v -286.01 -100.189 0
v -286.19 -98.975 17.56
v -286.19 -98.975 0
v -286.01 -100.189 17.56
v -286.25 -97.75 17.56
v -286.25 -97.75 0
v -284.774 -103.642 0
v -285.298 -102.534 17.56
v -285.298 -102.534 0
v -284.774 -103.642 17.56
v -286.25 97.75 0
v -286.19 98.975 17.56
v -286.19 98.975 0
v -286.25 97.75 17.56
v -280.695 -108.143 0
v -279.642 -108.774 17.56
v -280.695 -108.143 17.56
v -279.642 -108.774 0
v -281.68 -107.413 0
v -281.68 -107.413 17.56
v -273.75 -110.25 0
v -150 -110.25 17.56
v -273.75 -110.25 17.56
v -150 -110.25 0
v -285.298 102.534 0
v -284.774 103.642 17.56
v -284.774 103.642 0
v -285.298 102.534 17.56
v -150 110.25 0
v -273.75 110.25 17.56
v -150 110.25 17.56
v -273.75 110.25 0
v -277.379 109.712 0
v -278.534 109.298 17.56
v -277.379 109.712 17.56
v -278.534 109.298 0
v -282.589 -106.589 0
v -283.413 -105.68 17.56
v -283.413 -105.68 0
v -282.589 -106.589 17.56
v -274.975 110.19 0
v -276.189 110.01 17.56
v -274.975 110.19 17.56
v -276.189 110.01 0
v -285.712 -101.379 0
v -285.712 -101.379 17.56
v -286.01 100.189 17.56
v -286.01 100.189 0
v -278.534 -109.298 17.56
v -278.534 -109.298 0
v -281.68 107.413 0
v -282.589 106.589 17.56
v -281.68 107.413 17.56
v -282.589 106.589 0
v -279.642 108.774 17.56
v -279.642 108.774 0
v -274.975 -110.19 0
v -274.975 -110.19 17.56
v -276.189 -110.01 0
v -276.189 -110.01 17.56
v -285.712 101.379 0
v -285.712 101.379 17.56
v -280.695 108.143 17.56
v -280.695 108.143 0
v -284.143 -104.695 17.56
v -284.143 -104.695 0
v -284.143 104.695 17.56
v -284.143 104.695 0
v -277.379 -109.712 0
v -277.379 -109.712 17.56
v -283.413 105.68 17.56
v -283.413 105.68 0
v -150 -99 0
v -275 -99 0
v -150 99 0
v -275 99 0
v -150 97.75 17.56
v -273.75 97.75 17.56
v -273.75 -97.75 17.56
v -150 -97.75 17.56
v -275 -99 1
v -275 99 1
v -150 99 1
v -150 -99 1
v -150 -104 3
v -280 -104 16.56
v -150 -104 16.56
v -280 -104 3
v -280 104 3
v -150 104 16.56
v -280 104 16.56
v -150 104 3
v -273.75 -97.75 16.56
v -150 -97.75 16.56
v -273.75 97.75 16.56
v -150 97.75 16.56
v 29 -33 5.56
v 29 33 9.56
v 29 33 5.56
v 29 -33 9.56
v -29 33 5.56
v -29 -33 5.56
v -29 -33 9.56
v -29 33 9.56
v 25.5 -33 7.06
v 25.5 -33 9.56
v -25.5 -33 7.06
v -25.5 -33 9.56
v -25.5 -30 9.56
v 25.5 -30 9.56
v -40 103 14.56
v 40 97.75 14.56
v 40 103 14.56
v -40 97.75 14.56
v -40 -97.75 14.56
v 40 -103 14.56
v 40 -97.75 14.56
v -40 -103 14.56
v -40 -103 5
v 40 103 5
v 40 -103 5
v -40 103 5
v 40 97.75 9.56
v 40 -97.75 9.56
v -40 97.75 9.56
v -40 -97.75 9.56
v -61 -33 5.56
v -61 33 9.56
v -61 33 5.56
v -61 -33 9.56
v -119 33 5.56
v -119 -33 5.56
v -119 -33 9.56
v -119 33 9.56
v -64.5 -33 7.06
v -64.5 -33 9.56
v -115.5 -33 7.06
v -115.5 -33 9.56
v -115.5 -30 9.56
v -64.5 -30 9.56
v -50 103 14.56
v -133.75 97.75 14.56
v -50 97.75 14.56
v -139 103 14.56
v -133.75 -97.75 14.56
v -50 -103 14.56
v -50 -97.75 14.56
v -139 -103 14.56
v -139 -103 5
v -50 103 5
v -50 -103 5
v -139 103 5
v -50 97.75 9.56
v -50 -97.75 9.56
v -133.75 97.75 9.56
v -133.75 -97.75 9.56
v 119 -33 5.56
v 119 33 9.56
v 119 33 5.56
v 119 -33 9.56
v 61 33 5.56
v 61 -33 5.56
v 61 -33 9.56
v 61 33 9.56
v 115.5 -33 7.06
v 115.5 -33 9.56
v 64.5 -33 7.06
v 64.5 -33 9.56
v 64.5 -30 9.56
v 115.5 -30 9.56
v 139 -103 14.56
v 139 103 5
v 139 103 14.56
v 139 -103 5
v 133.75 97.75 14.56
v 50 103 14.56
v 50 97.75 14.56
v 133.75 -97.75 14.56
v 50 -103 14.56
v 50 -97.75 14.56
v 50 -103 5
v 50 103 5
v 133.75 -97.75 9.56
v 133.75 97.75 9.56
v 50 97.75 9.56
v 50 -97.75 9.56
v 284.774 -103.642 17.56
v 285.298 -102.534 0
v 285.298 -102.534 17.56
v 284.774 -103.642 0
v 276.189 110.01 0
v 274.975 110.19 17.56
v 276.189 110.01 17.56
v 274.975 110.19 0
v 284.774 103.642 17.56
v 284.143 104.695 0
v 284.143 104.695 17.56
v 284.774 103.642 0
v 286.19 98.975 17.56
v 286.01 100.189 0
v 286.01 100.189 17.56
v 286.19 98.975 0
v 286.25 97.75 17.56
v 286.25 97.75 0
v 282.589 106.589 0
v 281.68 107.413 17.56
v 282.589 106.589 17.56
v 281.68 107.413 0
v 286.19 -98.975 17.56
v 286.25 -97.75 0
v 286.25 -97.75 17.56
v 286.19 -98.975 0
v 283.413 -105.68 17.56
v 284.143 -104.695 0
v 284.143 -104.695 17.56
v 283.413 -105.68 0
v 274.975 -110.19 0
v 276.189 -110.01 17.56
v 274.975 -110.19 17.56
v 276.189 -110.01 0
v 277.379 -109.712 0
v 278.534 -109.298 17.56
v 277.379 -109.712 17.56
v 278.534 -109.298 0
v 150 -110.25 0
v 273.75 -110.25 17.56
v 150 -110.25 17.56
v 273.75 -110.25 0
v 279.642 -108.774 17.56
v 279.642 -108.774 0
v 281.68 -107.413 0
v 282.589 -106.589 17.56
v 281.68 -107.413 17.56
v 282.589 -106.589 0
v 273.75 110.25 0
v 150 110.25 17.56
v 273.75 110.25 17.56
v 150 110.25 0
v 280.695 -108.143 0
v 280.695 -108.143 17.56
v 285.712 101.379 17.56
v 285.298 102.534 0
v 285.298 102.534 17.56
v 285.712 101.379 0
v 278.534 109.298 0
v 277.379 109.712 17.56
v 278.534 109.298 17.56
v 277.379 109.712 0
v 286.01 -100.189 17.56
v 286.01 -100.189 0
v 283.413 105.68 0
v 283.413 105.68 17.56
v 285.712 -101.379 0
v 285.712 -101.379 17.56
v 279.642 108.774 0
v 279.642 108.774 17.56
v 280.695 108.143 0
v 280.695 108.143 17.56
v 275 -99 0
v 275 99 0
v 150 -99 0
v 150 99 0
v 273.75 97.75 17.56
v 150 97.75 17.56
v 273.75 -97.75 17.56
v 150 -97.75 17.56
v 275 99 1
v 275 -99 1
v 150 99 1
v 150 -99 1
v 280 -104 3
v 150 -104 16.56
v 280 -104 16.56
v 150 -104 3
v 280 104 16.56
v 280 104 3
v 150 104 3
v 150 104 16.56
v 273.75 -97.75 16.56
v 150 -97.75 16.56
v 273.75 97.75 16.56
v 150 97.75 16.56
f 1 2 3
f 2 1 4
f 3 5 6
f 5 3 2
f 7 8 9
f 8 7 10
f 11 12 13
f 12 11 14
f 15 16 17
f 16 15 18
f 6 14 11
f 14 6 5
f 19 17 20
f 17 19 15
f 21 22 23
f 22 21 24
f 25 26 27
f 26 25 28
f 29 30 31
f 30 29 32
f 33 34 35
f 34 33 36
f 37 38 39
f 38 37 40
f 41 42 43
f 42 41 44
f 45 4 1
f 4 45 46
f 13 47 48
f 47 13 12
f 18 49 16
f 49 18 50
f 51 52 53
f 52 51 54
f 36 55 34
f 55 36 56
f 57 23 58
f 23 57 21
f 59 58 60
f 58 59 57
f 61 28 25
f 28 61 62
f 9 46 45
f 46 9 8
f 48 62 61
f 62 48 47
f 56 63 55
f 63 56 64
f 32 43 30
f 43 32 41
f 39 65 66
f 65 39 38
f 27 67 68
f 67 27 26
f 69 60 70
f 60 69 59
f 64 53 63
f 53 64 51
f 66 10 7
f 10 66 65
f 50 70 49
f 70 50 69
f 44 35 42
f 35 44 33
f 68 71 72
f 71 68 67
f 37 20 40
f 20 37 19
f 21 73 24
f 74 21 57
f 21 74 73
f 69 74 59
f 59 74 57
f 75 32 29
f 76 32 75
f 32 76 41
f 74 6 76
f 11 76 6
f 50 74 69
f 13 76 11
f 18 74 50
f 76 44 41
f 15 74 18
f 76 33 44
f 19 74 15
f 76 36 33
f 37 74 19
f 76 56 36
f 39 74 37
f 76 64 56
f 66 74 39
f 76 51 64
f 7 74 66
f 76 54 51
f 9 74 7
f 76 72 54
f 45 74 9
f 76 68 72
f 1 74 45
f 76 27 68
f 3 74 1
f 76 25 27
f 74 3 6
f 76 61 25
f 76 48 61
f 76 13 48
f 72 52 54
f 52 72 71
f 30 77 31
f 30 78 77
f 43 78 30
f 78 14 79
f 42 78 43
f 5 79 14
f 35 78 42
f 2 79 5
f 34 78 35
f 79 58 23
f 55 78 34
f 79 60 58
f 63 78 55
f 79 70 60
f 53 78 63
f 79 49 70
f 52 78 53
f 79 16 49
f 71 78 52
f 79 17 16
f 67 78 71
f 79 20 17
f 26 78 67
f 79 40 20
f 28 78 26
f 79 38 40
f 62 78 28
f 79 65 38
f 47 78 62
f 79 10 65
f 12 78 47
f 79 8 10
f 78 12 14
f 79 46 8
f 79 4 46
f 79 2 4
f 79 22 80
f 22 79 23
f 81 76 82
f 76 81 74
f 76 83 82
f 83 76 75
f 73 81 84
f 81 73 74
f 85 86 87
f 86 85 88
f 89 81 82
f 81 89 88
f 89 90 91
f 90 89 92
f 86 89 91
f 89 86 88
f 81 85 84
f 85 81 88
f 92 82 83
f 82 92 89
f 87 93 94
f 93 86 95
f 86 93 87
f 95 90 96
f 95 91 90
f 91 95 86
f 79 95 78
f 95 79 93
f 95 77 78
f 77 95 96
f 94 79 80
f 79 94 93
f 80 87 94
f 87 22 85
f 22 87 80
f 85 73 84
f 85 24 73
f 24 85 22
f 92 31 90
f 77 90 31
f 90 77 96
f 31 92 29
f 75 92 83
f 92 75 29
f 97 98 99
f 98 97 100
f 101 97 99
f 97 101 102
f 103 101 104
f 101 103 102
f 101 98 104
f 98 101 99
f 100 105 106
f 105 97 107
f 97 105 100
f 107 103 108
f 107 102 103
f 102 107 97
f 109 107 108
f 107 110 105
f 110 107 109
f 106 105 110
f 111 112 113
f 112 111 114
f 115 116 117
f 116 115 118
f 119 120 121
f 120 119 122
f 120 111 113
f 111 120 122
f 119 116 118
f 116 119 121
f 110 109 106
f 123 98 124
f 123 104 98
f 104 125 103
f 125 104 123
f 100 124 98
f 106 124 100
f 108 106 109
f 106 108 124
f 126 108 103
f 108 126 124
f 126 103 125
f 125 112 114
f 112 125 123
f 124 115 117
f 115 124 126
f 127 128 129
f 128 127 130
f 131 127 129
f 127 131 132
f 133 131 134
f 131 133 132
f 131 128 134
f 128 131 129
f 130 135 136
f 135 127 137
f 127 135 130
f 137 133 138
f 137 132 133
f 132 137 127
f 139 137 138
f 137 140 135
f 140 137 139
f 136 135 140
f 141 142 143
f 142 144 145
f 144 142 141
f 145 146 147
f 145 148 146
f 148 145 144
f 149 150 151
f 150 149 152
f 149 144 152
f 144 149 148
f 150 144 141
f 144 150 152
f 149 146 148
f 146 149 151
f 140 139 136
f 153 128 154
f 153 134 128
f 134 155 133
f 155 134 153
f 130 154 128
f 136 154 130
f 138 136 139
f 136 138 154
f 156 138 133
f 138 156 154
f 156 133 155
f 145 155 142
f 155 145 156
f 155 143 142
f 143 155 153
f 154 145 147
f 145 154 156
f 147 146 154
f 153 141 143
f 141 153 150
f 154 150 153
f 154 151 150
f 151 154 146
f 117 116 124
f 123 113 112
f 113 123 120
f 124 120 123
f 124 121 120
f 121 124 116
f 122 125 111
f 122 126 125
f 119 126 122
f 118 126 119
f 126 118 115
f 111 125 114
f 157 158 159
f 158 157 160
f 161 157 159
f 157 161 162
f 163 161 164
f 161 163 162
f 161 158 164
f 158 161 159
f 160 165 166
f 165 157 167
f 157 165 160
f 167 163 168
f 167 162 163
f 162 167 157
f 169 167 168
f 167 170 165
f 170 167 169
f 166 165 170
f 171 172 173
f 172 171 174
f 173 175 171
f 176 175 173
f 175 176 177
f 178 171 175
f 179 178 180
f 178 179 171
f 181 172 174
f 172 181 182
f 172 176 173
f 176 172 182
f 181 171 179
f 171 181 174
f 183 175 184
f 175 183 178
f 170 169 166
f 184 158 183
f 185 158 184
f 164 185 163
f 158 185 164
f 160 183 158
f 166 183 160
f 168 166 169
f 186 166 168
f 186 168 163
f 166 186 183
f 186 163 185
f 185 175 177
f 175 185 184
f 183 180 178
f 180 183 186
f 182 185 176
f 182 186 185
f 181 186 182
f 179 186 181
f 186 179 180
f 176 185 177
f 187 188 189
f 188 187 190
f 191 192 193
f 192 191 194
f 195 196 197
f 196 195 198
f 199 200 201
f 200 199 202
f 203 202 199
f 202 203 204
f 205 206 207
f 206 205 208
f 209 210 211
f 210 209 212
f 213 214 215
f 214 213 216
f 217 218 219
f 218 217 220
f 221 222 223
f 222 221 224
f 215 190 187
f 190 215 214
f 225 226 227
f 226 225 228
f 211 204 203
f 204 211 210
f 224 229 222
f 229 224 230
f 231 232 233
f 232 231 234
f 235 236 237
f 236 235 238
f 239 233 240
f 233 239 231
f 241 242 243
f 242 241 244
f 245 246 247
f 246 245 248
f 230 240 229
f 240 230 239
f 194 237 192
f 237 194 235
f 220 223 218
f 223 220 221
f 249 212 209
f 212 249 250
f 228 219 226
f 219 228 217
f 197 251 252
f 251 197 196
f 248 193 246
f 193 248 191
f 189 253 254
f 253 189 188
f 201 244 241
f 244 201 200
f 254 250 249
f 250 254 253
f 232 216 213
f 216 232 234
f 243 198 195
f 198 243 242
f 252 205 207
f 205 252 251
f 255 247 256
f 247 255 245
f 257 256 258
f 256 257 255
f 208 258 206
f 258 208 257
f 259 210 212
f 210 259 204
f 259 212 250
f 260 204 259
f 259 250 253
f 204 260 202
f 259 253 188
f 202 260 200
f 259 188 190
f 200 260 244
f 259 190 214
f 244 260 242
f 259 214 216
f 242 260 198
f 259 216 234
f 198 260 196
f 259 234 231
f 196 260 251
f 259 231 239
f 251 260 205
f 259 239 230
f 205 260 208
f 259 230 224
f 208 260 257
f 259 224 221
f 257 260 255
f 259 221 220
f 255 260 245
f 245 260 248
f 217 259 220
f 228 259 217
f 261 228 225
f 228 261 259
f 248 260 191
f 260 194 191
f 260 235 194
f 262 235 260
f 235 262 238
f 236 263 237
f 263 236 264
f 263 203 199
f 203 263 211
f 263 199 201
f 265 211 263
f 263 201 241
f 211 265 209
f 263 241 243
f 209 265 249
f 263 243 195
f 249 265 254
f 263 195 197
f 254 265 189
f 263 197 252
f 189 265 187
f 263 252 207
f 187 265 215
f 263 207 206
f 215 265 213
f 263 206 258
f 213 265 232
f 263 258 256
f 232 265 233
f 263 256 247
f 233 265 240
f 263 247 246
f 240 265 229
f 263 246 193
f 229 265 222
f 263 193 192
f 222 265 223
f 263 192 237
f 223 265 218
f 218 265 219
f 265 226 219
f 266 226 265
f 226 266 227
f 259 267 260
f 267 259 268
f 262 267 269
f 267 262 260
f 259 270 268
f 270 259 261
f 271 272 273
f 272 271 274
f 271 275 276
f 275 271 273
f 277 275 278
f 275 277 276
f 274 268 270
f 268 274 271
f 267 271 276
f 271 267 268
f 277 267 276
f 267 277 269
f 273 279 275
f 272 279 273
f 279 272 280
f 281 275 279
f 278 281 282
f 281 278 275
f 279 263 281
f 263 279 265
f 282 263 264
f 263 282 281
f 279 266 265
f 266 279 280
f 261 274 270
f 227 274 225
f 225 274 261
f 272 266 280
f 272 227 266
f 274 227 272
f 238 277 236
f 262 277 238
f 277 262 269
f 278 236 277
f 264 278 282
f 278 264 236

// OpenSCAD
// file: ../inlays/nintendo_ds_game_card_inlay.scad
use <../../utilities/dictionary_get.scad>;

function nintendo_ds_game_card_inlay_width_mm() = 34;
function nintendo_ds_game_card_inlay_height_mm() = 36;

/**
 * A Nintendo DS game card (without the Nintendo 3DS tab).  Compatible with the
 * SPR, CTR, FTR, TWL and UTL models (and the un-codenamed "New 3DS" range).
 * Likely compatible with the USG and NTR models.
 * @param An array representing a dictionary, containing:
 *        - origin
 *          - x_mm - The origin of the inlay on the X axis, in millimeters.
 *          - y_mm - The origin of the inlay on the Y axis, in millimeters.
 * @return An array describing the inlay.
 */
function nintendo_ds_game_card_inlay(settings) =
  let (origin = dictionary_get(settings, "origin"))
  let (origin_x_mm = dictionary_get(origin, "x_mm"))
  let (origin_y_mm = dictionary_get(origin, "y_mm"))
  [
    ["type", "nintendo_ds_game_card"],
    [
      "origin",
      [
        ["x_mm", origin_x_mm],
        ["y_mm", origin_y_mm],
      ],
    ],
  ];
// file: ../utilities/settings.scad
/**
 * The number of millimeters that the glazing lip overlaps the glazing.
 */
function glazing_lip_thickness_mm() = 6.25;

/**
 * The depth of the glazing lip, in millimeters.
 */
function glazing_lip_depth_mm() = 1;

/**
 * The number of millimeters that the backing lip overlaps the backing.
 */
function backing_lip_thickness_mm() = 5;

/**
 * The depth of the backing lip, in millimeters.
 */
function backing_lip_depth_mm() = 3;

/**
 * The depth of slope to the backing lip, in millimeters.
 */
function backing_lip_slope_depth_mm() = 2;

/**
 * The minimum depth of the inlay layer, in millimeters.
 */
function inlay_bottom_depth_mm() = 0.56;

/**
 * The gap between the bottom of the glazing and the top of the displayed items,
 * in millimeters.
 */
function inlay_top_clearance_mm() = 1;

/**
 * The tolerance each side of the inlay in millimeters.
 */
function inlay_side_tolerance_mm() = 1;
// file: ../utilities/inlay_protrusion_depth_mm.scad
use <../../utilities/dictionary_get.scad>;

/**
 * Given an inlay, determines the depth (in millimeters) to which the inlay
 * should protrude from the frame.
 * @param inlay The inlay to measure.
 * @return      The depth (in millimeters) to which the inlay should protrude
 *              from the frame.
 */
function inlay_protrusion_depth_mm(inlay) = dictionary_get
(
  [
    ["nintendo_3ds_game_card", 1.3],
    ["nintendo_ds_game_card", 1.3],
    ["nintendo_game_boy_cartridge", 4],
    ["nintendo_game_boy_cartridge_c", 5],
  ],
  dictionary_get(inlay, "type")
);
// file: ../utilities/inlay_embed_depth_mm.scad
use <../../utilities/dictionary_get.scad>;

/**
 * Given an inlay, determines the depth (in millimeters) to which the inlay
 * should embed into the frame.
 * @param inlay The inlay to measure.
 * @return      The depth (in millimeters) to which the inlay should embed into
 *              the frame.
 */
function inlay_embed_depth_mm(inlay) = dictionary_get
(
  [
    ["nintendo_3ds_game_card", 2.5],
    ["nintendo_ds_game_card", 2.5],
    ["nintendo_game_boy_cartridge", 4],
    ["nintendo_game_boy_cartridge_c", 4],
  ],
  dictionary_get(inlay, "type")
);
// file: ../../utilities/dictionary_get.scad
/**
 * Retrieves a value by its key from an array representing a dictionary.
 * @param dictionary An array representing a dictionary.  Its contents must be
 *                   two-item arrays, each containing a key, then a value.
 * @param key        The key of the value to retrieve.
 * @return           The value matching the specified key.
 * @throws           When the key is not in the dictionary.
 * @throws           When the key is present in the dictionary multiple times.
 */
function dictionary_get(dictionary, key) =
  assert(
    len([for (item = dictionary) if (item[0] == key) item]) >= 1,
    "The given key was not found in the given dictionary"
  )
  assert(
    len([for (item = dictionary) if (item[0] == key) item]) <= 1,
    "The given key was found multiple times in the given dictionary"
  )
  [for (item = dictionary) if (item[0] == key) item][0][1];
// file: ../../utilities/slice_x.scad
module slice_x(left, right) {
  intersection() {
    translate([
      left,
      -10000,
      -10000,
    ]) {
      cube([
        right - left,
        20000,
        20000,
      ]);
    };

    children();
  };
};
// file: ../inlays/nintendo_game_boy_cartridge_inlay.scad
use <../../utilities/dictionary_get.scad>;

width_mm = 58;
height_mm = 66;

retainer_width_mm = 51;
retainer_depth_offset_mm = 1.5;
retainer_height_mm = 3;

/**
 * A Nintendo Game Boy cartridge, compatible with the DMG, MGB, CGB, AGB and AGS
 * models.
 * @param An array representing a dictionary, containing:
 *        - origin
 *          - x_mm - The origin of the inlay on the X axis, in millimeters.
 *          - y_mm - The origin of the inlay on the Y axis, in millimeters.
 * @return An array describing the inlay.
 */
function nintendo_game_boy_cartridge_inlay(settings) =
  let (origin = dictionary_get(settings, "origin"))
  let (origin_x_mm = dictionary_get(origin, "x_mm"))
  let (origin_y_mm = dictionary_get(origin, "y_mm"))
  [
    ["type", "nintendo_game_boy_cartridge"],
    [
      "origin",
      [
        ["x_mm", origin_x_mm],
        ["y_mm", origin_y_mm],
      ],
    ],
  ];

module nintendo_game_boy_cartridge_inlay(settings, inlay, embed_depth_mm) {
  difference() {
    translate([
      width_mm / -2,
      height_mm / -2,
      -embed_depth_mm,
    ]) {
      cube([
        width_mm,
        height_mm,
        embed_depth_mm,
      ]);
    };

    translate([
      retainer_width_mm / -2,
      height_mm / -2,
      retainer_depth_offset_mm - embed_depth_mm,
    ]) {
      rotate([0, 90, 0]) {
        linear_extrude(retainer_width_mm) {
          polygon([
            [0, 0],
            [retainer_depth_offset_mm - embed_depth_mm, retainer_height_mm],
            [retainer_depth_offset_mm - embed_depth_mm, 0],
          ]);
        };
      };
    };
  };
};
// file: ../borders/rounded_flat_border.scad
use <../../utilities/dictionary_get.scad>;

/**
 * A rounded flat border.
 * @param An array representing a dictionary, containing:
 *        - thickness_mm - The thickness of the frame in millimeters.
 *        - sides        - The number of sides per corner.
 * @return An array describing the border.
 */
function rounded_flat_border(settings) =
  let (thickness_mm = dictionary_get(settings, "thickness_mm"))
  let (sides = dictionary_get(settings, "sides"))
  [
    ["type", "rounded_flat"],
    ["thickness_mm", thickness_mm],
    ["sides", sides],
  ];
// file: ../backings/a4_backing.scad
/**
 * Measurements taken from a B&M "New York" frame.
 */
function a4_backing() = [
  ["width_mm", 260],
  ["height_mm", 208],
  ["depth_mm", 2],
];
// file: ../glazings/a4_glazing.scad
/**
 * Measurements taken from a B&M "New York" frame.
 */
function a4_glazing() = [
  ["width_mm", 260],
  ["height_mm", 208],
  ["depth_mm", 2],
];
// file: ../inlay.scad
use <../utilities/dictionary_get.scad>;
use <inlays/nintendo_ds_game_card_inlay.scad>;
use <inlays/nintendo_game_boy_cartridge_inlay.scad>;
use <utilities/inlay_embed_depth_mm.scad>;
use <utilities/inlay_protrusion_depth_mm.scad>;
use <utilities/settings.scad>;

module inlay(settings) {
  glazing = dictionary_get(settings, "glazing");
  glazing_width_mm = dictionary_get(glazing, "width_mm");
  glazing_height_mm = dictionary_get(glazing, "height_mm");

  backing = dictionary_get(settings, "backing");
  backing_width_mm = dictionary_get(backing, "width_mm");
  backing_height_mm = dictionary_get(backing, "height_mm");
  backing_depth_mm = dictionary_get(backing, "depth_mm");

  inlays = dictionary_get(settings, "inlays");

  greatest_inlay_embed_depth_mm = max([ for (inlay = inlays) inlay_embed_depth_mm(inlay) ]);
  greatest_inlay_protrusion_depth_mm = max([ for (inlay = inlays) inlay_protrusion_depth_mm(inlay) ]);

  inlay_width_mm = max(glazing_width_mm, backing_width_mm) - inlay_side_tolerance_mm() * 2;
  inlay_height_mm = max(glazing_height_mm, backing_height_mm) - inlay_side_tolerance_mm() * 2;

  difference() {
    translate([
      inlay_width_mm / -2,
      inlay_height_mm / -2,
      backing_lip_depth_mm()
        + backing_depth_mm,
    ]) {
      cube([
        inlay_width_mm,
        inlay_height_mm,
        inlay_bottom_depth_mm()
          + greatest_inlay_embed_depth_mm
          + greatest_inlay_protrusion_depth_mm
          + inlay_top_clearance_mm(),
      ]);
    };

    translate([
      inlay_width_mm / -2 + glazing_lip_thickness_mm() - inlay_side_tolerance_mm(),
      inlay_height_mm / -2 + glazing_lip_thickness_mm() - inlay_side_tolerance_mm(),
      backing_lip_depth_mm()
        + backing_depth_mm
        + inlay_bottom_depth_mm()
        + greatest_inlay_embed_depth_mm,
    ]) {
      cube([
        inlay_width_mm - glazing_lip_thickness_mm() * 2 + inlay_side_tolerance_mm() * 2,
        inlay_height_mm - glazing_lip_thickness_mm() * 2 + inlay_side_tolerance_mm() * 2,
        greatest_inlay_protrusion_depth_mm + inlay_top_clearance_mm(),
      ]);
    };

    translate([
      0,
      0,
      backing_lip_depth_mm()
        + backing_depth_mm
        + inlay_bottom_depth_mm()
        + greatest_inlay_embed_depth_mm,
    ]) {
      for (inlay = inlays) {
        inlay_type = dictionary_get(inlay, "type");

        embed_depth_mm = inlay_embed_depth_mm(inlay);

        origin = dictionary_get(inlay, "origin");

        origin_x_mm = dictionary_get(origin, "x_mm");
        origin_y_mm = dictionary_get(origin, "y_mm");

        translate([
          origin_x_mm,
          origin_y_mm,
          0,
        ]) {
          if (inlay_type == "nintendo_game_boy_cartridge") {
            nintendo_game_boy_cartridge_inlay(settings, inlay, embed_depth_mm);
          } else if (inlay_type == "nintendo_ds_game_card") {
            translate([
              nintendo_ds_game_card_inlay_width_mm() / -2,
              nintendo_ds_game_card_inlay_height_mm() / -2,
              -embed_depth_mm,
            ]) {
              cube([
                nintendo_ds_game_card_inlay_width_mm(),
                nintendo_ds_game_card_inlay_height_mm(),
                embed_depth_mm,
              ]);
            };
          } else {
            assert(false, "Unexpected inlay type");
          };
        };
      };
    };
  };
};
// file: ../frame.scad
use <../utilities/dictionary_get.scad>;
use <utilities/inlay_embed_depth_mm.scad>;
use <utilities/inlay_protrusion_depth_mm.scad>;
use <utilities/settings.scad>;

module frame(settings) {
  glazing = dictionary_get(settings, "glazing");
  glazing_width_mm = dictionary_get(glazing, "width_mm");
  glazing_height_mm = dictionary_get(glazing, "height_mm");
  glazing_depth_mm = dictionary_get(glazing, "depth_mm");

  backing = dictionary_get(settings, "backing");
  backing_width_mm = dictionary_get(backing, "width_mm");
  backing_height_mm = dictionary_get(backing, "height_mm");
  backing_depth_mm = dictionary_get(backing, "depth_mm");

  border = dictionary_get(settings, "border");
  border_type = dictionary_get(border, "type");
  border_thickness_mm = dictionary_get(border, "thickness_mm");

  inlays = dictionary_get(settings, "inlays");

  greatest_inlay_embed_depth_mm = max([ for (inlay = inlays) inlay_embed_depth_mm(inlay) ]);
  greatest_inlay_protrusion_depth_mm = max([ for (inlay = inlays) inlay_protrusion_depth_mm(inlay) ]);

  inlay_width_mm = max(glazing_width_mm, backing_width_mm);
  width_mm = inlay_width_mm + border_thickness_mm * 2 - glazing_lip_thickness_mm() * 2;
  inlay_height_mm = max(glazing_height_mm, backing_height_mm);
  height_mm = inlay_height_mm + border_thickness_mm * 2 - glazing_lip_thickness_mm() * 2;
  depth_mm =
    backing_lip_depth_mm()
    + backing_depth_mm
    + inlay_bottom_depth_mm()
    + greatest_inlay_embed_depth_mm
    + greatest_inlay_protrusion_depth_mm
    + inlay_top_clearance_mm()
    + glazing_depth_mm
    + glazing_lip_depth_mm();

  difference() {
    if (border_type == "square") {
      translate([
        width_mm / -2,
        height_mm / -2,
        0,
      ]) {
        cube([
          width_mm,
          height_mm,
          depth_mm,
        ]);
      };
    } else if (border_type == "rounded_flat") {
      border_thickness_mm = dictionary_get(border, "thickness_mm");
      border_sides = dictionary_get(border, "sides");

      linear_extrude(depth_mm) {
        hull() {
          translate([
            width_mm / -2 + border_thickness_mm,
            height_mm / -2 + border_thickness_mm,
          ]) {
            circle(r = border_thickness_mm, $fn = border_sides);
          };

          translate([
            width_mm / 2 - border_thickness_mm,
            height_mm / -2 + border_thickness_mm,
          ]) {
            circle(r = border_thickness_mm, $fn = border_sides);
          };

          translate([
            width_mm / -2 + border_thickness_mm,
            height_mm / 2 - border_thickness_mm,
          ]) {
            circle(r = border_thickness_mm, $fn = border_sides);
          };

          translate([
            width_mm / 2 - border_thickness_mm,
            height_mm / 2 - border_thickness_mm,
          ]) {
            circle(r = border_thickness_mm, $fn = border_sides);
          };
        };
      };
    } else {
      assert(false, "Unexpected inlay type");
    };

    backing_apeture_width_mm = backing_width_mm - backing_lip_thickness_mm() * 2;
    backing_apeture_height_mm = backing_height_mm - backing_lip_thickness_mm() * 2;

    translate([
      backing_apeture_width_mm / -2,
      backing_apeture_height_mm / -2,
      0,
    ]) {
      cube([
        backing_apeture_width_mm,
        backing_apeture_height_mm,
        backing_lip_depth_mm() - backing_lip_slope_depth_mm(),
      ]);
    };

    hull() {
      translate([
        backing_apeture_width_mm / -2,
        backing_apeture_height_mm / -2,
        backing_lip_depth_mm() - backing_lip_slope_depth_mm(),
      ]) {
        cube([
          backing_apeture_width_mm,
          backing_apeture_height_mm,
          backing_lip_slope_depth_mm(),
        ]);
      };

      translate([
        backing_width_mm / -2,
        backing_height_mm / -2,
        backing_lip_depth_mm(),
      ]) {
        cube([
          backing_width_mm,
          backing_height_mm,
          backing_depth_mm,
        ]);
      };
    };

    translate([
      backing_width_mm / -2,
      backing_height_mm / -2,
      backing_lip_depth_mm(),
    ]) {
      cube([
        backing_width_mm,
        backing_height_mm,
        backing_depth_mm,
      ]);
    };

    translate([
      inlay_width_mm / -2,
      inlay_height_mm / -2,
      backing_lip_depth_mm() + backing_depth_mm,
    ]) {
      cube([
        backing_width_mm,
        backing_height_mm,
        inlay_bottom_depth_mm()
          + greatest_inlay_embed_depth_mm
          + greatest_inlay_protrusion_depth_mm
          + inlay_top_clearance_mm(),
      ]);
    };

    translate([
      glazing_width_mm / -2,
      glazing_height_mm / -2,
      depth_mm - glazing_lip_depth_mm() - glazing_depth_mm,
    ]) {
      cube([
        glazing_width_mm,
        glazing_height_mm,
        glazing_depth_mm,
      ]);
    };

    glazing_apeture_width_mm = glazing_width_mm - glazing_lip_thickness_mm() * 2;
    glazing_apeture_height_mm = glazing_height_mm - glazing_lip_thickness_mm() * 2;

    translate([
      glazing_apeture_width_mm / -2,
      glazing_apeture_height_mm / -2,
      depth_mm - glazing_lip_depth_mm(),
    ]) {
      cube([
        glazing_apeture_width_mm,
        glazing_apeture_height_mm,
        glazing_lip_depth_mm(),
      ]);
    };
  };
};
// main file
use <../frame.scad>;
use <../inlay.scad>;
use <../glazings/a4_glazing.scad>;
use <../backings/a4_backing.scad>;
use <../borders/rounded_flat_border.scad>;
use <../inlays/nintendo_game_boy_cartridge_inlay.scad>;
use <../../utilities/slice_x.scad>;

settings = [
  ["glazing", a4_glazing()],
  ["backing", a4_backing()],
  [
    "border",
    rounded_flat_border([
      ["thickness_mm", 12.5],
      ["sides", 64],
    ]),
  ],
  [
    "inlays", [
      nintendo_game_boy_cartridge_inlay([
        [
          "origin", [
            ["x_mm", -80],
            ["y_mm", 0],
          ],
        ],
      ]),
      nintendo_game_boy_cartridge_inlay([
        [
          "origin", [
            ["x_mm", 0],
            ["y_mm", 0],
          ],
        ],
      ]),
      nintendo_game_boy_cartridge_inlay([
        [
          "origin", [
            ["x_mm", 80],
            ["y_mm", 0],
          ],
        ],
      ]),
    ],
  ],
];

translate([-150, 0, 0]) {
  slice_x(-10000, 0) {
    frame(settings);
  };
};

translate([-10, 0, 0]) {
  slice_x(-10000, -40) {
    inlay(settings);
  };
};

slice_x(-40, 40) {
  inlay(settings);
};

translate([10, 0, 0]) {
  slice_x(40, 10000) {
    inlay(settings);
  };
};

translate([150, 0, 0]) {
  slice_x(0, 10000) {
    frame(settings);
  };
};
